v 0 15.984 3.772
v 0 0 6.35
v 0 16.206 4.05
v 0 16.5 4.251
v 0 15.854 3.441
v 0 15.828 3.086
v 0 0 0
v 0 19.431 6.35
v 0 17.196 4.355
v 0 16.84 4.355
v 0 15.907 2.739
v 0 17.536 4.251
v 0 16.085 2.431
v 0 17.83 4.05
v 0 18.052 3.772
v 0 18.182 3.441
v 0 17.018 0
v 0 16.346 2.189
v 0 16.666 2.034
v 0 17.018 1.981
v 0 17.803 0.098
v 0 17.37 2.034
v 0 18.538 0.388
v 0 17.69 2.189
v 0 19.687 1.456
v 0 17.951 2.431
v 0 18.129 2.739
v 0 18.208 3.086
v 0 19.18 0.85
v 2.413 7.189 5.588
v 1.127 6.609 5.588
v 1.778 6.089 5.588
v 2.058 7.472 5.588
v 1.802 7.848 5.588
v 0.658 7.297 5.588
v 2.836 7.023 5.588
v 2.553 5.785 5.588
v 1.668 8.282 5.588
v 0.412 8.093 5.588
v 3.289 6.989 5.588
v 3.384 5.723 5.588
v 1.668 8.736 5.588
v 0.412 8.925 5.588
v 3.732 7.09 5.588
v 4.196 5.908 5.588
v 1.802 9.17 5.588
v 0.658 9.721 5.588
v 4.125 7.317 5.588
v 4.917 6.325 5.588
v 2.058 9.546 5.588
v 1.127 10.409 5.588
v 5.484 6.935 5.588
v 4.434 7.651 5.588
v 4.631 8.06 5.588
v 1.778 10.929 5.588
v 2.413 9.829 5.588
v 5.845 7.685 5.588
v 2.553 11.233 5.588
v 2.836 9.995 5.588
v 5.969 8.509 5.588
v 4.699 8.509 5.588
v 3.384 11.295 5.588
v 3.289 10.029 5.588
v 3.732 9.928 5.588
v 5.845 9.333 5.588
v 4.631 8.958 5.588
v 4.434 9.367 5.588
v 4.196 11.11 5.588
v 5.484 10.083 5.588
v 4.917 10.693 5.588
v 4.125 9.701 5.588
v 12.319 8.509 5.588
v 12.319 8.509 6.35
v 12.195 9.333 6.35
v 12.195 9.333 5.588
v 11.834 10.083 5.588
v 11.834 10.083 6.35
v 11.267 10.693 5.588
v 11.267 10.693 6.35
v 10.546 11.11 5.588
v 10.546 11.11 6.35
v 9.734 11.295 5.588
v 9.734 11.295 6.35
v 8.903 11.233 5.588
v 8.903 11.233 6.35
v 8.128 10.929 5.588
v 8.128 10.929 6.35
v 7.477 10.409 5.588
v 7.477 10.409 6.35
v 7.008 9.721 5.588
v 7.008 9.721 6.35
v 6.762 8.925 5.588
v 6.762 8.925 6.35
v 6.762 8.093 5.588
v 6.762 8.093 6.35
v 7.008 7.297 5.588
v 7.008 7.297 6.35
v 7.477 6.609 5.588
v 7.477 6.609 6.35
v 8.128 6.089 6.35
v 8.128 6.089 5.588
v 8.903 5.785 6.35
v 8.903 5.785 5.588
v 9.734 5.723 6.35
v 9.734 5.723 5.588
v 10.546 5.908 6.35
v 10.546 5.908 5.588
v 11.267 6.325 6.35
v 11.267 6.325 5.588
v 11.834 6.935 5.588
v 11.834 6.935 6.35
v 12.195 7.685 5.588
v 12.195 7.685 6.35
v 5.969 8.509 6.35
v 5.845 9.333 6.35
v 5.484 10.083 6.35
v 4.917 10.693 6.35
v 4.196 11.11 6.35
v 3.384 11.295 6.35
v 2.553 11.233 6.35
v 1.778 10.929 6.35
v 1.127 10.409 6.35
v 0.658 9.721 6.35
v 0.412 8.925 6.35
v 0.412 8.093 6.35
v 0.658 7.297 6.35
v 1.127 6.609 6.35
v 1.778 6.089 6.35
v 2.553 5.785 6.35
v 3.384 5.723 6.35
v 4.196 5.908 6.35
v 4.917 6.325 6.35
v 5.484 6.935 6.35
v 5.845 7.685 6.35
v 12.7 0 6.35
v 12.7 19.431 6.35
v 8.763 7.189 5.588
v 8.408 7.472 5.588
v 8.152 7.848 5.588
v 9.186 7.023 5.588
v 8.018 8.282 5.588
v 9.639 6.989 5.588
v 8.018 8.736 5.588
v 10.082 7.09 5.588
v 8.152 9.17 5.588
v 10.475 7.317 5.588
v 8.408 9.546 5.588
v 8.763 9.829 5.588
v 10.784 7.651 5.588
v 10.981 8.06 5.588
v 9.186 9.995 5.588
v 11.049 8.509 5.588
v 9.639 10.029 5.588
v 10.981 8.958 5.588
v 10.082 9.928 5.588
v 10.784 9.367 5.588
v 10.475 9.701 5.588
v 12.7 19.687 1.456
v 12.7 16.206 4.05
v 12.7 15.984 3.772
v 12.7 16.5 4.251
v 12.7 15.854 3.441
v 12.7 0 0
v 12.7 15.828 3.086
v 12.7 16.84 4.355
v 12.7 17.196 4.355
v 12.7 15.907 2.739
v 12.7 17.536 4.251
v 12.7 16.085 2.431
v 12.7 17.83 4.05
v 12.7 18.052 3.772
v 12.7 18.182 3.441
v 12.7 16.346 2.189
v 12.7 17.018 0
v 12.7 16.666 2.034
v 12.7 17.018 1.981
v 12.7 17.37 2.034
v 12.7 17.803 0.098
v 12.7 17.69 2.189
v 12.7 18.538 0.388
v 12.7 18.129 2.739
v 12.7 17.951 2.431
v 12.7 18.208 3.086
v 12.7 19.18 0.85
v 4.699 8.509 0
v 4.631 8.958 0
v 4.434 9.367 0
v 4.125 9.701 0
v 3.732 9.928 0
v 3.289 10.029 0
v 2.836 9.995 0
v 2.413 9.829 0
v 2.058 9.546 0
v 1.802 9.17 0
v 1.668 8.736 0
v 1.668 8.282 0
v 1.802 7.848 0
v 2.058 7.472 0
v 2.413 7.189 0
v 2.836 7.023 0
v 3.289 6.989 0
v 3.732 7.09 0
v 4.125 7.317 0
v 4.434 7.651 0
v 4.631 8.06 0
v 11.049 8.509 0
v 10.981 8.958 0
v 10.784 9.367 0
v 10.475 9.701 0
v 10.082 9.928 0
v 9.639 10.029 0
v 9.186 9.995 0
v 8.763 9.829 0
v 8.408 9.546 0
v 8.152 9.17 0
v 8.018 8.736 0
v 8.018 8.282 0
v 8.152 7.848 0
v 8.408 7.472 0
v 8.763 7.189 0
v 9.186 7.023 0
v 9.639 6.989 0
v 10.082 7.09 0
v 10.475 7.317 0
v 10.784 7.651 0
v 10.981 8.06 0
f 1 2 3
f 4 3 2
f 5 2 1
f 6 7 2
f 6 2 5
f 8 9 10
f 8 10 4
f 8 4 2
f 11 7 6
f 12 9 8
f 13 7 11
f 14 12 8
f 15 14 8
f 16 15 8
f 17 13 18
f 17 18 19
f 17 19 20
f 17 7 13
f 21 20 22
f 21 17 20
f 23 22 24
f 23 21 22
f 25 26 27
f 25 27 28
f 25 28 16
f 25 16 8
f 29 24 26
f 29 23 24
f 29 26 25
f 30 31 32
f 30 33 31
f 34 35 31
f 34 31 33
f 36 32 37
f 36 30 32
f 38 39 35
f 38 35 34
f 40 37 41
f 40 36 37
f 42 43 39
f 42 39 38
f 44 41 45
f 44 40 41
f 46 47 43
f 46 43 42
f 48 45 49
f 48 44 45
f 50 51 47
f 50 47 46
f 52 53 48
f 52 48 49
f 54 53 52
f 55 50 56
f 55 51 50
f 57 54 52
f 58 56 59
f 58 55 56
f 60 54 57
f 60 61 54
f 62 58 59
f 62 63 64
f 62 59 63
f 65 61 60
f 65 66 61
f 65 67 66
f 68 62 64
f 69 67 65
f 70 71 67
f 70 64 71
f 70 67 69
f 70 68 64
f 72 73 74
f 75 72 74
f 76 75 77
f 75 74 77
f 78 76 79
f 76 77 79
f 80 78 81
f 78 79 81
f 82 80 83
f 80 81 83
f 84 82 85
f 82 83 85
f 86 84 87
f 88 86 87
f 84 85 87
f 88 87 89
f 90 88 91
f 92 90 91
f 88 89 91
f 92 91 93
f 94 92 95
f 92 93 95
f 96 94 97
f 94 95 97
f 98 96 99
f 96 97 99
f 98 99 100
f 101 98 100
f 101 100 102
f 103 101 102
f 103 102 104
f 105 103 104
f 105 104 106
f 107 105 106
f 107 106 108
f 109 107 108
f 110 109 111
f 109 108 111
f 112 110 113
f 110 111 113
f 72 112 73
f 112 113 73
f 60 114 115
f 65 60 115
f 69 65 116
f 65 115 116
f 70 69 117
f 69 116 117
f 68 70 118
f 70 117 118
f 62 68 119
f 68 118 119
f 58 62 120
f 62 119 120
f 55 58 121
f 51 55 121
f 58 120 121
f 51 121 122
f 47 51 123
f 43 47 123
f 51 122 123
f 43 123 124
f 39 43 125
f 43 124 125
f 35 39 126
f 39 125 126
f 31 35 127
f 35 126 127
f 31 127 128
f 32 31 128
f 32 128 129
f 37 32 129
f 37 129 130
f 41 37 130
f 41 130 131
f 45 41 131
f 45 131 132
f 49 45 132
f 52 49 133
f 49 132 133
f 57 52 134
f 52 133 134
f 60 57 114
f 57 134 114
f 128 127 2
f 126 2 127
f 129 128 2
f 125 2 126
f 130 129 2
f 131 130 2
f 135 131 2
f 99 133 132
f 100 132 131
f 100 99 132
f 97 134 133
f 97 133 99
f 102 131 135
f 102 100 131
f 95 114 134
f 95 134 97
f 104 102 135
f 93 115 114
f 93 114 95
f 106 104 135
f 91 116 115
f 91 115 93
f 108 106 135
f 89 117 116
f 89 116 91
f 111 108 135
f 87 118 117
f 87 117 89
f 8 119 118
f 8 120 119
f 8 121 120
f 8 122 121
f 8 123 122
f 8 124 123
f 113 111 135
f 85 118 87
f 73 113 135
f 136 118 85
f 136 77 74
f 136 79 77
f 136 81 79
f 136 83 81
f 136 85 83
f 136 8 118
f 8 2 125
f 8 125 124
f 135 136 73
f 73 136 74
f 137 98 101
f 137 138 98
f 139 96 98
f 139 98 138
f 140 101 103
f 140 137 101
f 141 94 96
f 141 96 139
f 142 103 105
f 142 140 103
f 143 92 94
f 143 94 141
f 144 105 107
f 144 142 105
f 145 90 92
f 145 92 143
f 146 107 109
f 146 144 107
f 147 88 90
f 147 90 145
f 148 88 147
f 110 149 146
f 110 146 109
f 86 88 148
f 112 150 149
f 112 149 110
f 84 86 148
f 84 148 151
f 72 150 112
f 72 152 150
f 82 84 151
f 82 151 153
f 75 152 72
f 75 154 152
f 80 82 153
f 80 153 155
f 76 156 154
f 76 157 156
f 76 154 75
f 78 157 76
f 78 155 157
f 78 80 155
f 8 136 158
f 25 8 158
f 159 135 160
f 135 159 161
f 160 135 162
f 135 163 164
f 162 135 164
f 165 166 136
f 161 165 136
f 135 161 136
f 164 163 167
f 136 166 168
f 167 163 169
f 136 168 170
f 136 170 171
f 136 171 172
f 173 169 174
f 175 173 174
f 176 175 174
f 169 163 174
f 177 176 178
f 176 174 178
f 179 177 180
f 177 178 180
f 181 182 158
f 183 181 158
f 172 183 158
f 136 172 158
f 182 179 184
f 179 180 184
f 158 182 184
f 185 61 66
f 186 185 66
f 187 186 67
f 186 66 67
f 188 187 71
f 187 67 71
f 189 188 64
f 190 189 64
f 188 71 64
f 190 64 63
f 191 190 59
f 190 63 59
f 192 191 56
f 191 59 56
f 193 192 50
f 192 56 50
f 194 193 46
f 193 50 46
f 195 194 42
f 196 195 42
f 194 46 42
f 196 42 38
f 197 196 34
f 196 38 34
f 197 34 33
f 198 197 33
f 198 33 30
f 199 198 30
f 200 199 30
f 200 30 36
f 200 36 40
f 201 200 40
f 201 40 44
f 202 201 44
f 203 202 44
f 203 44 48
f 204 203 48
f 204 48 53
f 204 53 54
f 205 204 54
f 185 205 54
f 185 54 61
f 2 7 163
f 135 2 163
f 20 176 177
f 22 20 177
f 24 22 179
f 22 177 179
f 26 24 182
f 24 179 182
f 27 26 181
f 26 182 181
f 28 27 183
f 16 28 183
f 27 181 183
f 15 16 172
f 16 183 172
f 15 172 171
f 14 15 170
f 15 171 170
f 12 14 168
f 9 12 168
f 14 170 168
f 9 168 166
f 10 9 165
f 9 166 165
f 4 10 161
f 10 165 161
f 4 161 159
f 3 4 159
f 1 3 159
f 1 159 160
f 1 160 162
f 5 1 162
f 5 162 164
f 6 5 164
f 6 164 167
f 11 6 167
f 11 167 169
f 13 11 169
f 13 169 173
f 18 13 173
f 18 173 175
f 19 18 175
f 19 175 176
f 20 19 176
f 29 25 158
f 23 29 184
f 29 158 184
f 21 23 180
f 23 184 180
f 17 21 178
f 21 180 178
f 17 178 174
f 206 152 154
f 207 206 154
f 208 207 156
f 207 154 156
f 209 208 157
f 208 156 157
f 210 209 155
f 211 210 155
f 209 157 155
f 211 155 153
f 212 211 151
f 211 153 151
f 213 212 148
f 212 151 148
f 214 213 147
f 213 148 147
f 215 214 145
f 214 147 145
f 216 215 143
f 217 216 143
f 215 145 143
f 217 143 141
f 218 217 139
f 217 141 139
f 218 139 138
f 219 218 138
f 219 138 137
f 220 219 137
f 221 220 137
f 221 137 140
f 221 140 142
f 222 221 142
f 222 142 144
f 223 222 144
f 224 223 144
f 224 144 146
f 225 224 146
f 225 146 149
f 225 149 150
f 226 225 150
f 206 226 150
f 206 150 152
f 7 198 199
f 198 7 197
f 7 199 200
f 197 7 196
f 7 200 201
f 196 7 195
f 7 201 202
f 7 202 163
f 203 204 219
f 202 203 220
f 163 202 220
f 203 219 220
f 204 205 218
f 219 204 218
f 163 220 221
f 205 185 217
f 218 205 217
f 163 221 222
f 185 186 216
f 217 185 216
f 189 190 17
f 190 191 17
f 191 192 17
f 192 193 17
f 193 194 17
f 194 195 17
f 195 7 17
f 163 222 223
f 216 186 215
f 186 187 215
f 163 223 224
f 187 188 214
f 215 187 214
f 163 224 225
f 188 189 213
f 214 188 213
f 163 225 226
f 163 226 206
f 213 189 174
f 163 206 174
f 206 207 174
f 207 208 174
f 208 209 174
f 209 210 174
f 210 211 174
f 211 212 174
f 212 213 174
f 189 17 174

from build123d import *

# Parameters (mm, degrees)
SKETCH1_W           = 12.7
SKETCH1_H           = 20.193
BOSS_EXTRUDE1_DEPTH = 6.35
SKETCH3_R           = 1.524
CUT_EXTRUDE1_DEPTH  = 25.685415715
SKETCH4_R           = 2.794
CUT_EXTRUDE2_DEPTH  = 0.762
SKETCH8_R           = 1.1938
CUT_EXTRUDE5_DEPTH  = 25.685415715
CUT_EXTRUDE7_DEPTH  = 25.685415715
CUT_EXTRUDE8_DEPTH  = 25.685415715


with BuildPart() as part:
    # Sketch1 → Boss-Extrude1 (new body)
    with BuildSketch(Plane.XY):
        with Locations((6.35, 10.0965)):
            Rectangle(SKETCH1_W, SKETCH1_H)
    extrude(amount=BOSS_EXTRUDE1_DEPTH)

    # Sketch3 → Cut-Extrude1 (cut, through all)
    with BuildSketch(Plane.XY.offset(6.35)):
        with Locations((3.175, 8.509)):
            Circle(SKETCH3_R)
        with Locations((9.525, 8.509)):
            Circle(SKETCH3_R)
    extrude(amount=-CUT_EXTRUDE1_DEPTH, mode=Mode.SUBTRACT)

    # Sketch4 → Cut-Extrude2 (cut)
    with BuildSketch(Plane.XY.offset(6.35)):
        with Locations((3.175, 8.509)):
            Circle(SKETCH4_R)
        with Locations((9.525, 8.509)):
            Circle(SKETCH4_R)
    extrude(amount=-CUT_EXTRUDE2_DEPTH, mode=Mode.SUBTRACT)

    # Sketch8 → Cut-Extrude5 (cut, through all)
    with BuildSketch(Plane(origin=(12.7, 0, 0), x_dir=(0, 0, -1), z_dir=(1, 0, 0))):
        with Locations((-3.175, 17.018)):
            Circle(SKETCH8_R)
    extrude(amount=-CUT_EXTRUDE5_DEPTH, mode=Mode.SUBTRACT)

    # Sketch12 → Cut-Extrude7 (cut, through all)
    with BuildSketch(Plane(origin=(12.7, 0, 0), x_dir=(0, 0, -1), z_dir=(1, 0, 0))):
        with BuildLine():
            Line((-6.35, 20.193), (-3.175, 20.193))
            ThreePointArc((-3.175, 20.193), (-0.92993597, 19.26306403), (0, 17.018))
            Line((0, 17.018), (0, 13.936871151))
            Line((0, 13.936871151), (3.924146207, 13.936871151))
            Line((3.924146207, 13.936871151), (3.924146207, 24.495106429))
            Line((3.924146207, 24.495106429), (-6.35, 24.495106429))
            Line((-6.35, 24.495106429), (-6.35, 20.193))
        make_face()
    extrude(amount=-CUT_EXTRUDE7_DEPTH, mode=Mode.SUBTRACT)

    # Sketch13 → Cut-Extrude8 (cut, through all)
    with BuildSketch(Plane(origin=(12.7, 0, 0), x_dir=(0, 0, -1), z_dir=(1, 0, 0))):
        Polygon((-6.35, 19.431), (8.189826156, 20.193), (-6.35, 20.193), align=None)
    extrude(amount=-CUT_EXTRUDE8_DEPTH, mode=Mode.SUBTRACT)


solid = part.part
